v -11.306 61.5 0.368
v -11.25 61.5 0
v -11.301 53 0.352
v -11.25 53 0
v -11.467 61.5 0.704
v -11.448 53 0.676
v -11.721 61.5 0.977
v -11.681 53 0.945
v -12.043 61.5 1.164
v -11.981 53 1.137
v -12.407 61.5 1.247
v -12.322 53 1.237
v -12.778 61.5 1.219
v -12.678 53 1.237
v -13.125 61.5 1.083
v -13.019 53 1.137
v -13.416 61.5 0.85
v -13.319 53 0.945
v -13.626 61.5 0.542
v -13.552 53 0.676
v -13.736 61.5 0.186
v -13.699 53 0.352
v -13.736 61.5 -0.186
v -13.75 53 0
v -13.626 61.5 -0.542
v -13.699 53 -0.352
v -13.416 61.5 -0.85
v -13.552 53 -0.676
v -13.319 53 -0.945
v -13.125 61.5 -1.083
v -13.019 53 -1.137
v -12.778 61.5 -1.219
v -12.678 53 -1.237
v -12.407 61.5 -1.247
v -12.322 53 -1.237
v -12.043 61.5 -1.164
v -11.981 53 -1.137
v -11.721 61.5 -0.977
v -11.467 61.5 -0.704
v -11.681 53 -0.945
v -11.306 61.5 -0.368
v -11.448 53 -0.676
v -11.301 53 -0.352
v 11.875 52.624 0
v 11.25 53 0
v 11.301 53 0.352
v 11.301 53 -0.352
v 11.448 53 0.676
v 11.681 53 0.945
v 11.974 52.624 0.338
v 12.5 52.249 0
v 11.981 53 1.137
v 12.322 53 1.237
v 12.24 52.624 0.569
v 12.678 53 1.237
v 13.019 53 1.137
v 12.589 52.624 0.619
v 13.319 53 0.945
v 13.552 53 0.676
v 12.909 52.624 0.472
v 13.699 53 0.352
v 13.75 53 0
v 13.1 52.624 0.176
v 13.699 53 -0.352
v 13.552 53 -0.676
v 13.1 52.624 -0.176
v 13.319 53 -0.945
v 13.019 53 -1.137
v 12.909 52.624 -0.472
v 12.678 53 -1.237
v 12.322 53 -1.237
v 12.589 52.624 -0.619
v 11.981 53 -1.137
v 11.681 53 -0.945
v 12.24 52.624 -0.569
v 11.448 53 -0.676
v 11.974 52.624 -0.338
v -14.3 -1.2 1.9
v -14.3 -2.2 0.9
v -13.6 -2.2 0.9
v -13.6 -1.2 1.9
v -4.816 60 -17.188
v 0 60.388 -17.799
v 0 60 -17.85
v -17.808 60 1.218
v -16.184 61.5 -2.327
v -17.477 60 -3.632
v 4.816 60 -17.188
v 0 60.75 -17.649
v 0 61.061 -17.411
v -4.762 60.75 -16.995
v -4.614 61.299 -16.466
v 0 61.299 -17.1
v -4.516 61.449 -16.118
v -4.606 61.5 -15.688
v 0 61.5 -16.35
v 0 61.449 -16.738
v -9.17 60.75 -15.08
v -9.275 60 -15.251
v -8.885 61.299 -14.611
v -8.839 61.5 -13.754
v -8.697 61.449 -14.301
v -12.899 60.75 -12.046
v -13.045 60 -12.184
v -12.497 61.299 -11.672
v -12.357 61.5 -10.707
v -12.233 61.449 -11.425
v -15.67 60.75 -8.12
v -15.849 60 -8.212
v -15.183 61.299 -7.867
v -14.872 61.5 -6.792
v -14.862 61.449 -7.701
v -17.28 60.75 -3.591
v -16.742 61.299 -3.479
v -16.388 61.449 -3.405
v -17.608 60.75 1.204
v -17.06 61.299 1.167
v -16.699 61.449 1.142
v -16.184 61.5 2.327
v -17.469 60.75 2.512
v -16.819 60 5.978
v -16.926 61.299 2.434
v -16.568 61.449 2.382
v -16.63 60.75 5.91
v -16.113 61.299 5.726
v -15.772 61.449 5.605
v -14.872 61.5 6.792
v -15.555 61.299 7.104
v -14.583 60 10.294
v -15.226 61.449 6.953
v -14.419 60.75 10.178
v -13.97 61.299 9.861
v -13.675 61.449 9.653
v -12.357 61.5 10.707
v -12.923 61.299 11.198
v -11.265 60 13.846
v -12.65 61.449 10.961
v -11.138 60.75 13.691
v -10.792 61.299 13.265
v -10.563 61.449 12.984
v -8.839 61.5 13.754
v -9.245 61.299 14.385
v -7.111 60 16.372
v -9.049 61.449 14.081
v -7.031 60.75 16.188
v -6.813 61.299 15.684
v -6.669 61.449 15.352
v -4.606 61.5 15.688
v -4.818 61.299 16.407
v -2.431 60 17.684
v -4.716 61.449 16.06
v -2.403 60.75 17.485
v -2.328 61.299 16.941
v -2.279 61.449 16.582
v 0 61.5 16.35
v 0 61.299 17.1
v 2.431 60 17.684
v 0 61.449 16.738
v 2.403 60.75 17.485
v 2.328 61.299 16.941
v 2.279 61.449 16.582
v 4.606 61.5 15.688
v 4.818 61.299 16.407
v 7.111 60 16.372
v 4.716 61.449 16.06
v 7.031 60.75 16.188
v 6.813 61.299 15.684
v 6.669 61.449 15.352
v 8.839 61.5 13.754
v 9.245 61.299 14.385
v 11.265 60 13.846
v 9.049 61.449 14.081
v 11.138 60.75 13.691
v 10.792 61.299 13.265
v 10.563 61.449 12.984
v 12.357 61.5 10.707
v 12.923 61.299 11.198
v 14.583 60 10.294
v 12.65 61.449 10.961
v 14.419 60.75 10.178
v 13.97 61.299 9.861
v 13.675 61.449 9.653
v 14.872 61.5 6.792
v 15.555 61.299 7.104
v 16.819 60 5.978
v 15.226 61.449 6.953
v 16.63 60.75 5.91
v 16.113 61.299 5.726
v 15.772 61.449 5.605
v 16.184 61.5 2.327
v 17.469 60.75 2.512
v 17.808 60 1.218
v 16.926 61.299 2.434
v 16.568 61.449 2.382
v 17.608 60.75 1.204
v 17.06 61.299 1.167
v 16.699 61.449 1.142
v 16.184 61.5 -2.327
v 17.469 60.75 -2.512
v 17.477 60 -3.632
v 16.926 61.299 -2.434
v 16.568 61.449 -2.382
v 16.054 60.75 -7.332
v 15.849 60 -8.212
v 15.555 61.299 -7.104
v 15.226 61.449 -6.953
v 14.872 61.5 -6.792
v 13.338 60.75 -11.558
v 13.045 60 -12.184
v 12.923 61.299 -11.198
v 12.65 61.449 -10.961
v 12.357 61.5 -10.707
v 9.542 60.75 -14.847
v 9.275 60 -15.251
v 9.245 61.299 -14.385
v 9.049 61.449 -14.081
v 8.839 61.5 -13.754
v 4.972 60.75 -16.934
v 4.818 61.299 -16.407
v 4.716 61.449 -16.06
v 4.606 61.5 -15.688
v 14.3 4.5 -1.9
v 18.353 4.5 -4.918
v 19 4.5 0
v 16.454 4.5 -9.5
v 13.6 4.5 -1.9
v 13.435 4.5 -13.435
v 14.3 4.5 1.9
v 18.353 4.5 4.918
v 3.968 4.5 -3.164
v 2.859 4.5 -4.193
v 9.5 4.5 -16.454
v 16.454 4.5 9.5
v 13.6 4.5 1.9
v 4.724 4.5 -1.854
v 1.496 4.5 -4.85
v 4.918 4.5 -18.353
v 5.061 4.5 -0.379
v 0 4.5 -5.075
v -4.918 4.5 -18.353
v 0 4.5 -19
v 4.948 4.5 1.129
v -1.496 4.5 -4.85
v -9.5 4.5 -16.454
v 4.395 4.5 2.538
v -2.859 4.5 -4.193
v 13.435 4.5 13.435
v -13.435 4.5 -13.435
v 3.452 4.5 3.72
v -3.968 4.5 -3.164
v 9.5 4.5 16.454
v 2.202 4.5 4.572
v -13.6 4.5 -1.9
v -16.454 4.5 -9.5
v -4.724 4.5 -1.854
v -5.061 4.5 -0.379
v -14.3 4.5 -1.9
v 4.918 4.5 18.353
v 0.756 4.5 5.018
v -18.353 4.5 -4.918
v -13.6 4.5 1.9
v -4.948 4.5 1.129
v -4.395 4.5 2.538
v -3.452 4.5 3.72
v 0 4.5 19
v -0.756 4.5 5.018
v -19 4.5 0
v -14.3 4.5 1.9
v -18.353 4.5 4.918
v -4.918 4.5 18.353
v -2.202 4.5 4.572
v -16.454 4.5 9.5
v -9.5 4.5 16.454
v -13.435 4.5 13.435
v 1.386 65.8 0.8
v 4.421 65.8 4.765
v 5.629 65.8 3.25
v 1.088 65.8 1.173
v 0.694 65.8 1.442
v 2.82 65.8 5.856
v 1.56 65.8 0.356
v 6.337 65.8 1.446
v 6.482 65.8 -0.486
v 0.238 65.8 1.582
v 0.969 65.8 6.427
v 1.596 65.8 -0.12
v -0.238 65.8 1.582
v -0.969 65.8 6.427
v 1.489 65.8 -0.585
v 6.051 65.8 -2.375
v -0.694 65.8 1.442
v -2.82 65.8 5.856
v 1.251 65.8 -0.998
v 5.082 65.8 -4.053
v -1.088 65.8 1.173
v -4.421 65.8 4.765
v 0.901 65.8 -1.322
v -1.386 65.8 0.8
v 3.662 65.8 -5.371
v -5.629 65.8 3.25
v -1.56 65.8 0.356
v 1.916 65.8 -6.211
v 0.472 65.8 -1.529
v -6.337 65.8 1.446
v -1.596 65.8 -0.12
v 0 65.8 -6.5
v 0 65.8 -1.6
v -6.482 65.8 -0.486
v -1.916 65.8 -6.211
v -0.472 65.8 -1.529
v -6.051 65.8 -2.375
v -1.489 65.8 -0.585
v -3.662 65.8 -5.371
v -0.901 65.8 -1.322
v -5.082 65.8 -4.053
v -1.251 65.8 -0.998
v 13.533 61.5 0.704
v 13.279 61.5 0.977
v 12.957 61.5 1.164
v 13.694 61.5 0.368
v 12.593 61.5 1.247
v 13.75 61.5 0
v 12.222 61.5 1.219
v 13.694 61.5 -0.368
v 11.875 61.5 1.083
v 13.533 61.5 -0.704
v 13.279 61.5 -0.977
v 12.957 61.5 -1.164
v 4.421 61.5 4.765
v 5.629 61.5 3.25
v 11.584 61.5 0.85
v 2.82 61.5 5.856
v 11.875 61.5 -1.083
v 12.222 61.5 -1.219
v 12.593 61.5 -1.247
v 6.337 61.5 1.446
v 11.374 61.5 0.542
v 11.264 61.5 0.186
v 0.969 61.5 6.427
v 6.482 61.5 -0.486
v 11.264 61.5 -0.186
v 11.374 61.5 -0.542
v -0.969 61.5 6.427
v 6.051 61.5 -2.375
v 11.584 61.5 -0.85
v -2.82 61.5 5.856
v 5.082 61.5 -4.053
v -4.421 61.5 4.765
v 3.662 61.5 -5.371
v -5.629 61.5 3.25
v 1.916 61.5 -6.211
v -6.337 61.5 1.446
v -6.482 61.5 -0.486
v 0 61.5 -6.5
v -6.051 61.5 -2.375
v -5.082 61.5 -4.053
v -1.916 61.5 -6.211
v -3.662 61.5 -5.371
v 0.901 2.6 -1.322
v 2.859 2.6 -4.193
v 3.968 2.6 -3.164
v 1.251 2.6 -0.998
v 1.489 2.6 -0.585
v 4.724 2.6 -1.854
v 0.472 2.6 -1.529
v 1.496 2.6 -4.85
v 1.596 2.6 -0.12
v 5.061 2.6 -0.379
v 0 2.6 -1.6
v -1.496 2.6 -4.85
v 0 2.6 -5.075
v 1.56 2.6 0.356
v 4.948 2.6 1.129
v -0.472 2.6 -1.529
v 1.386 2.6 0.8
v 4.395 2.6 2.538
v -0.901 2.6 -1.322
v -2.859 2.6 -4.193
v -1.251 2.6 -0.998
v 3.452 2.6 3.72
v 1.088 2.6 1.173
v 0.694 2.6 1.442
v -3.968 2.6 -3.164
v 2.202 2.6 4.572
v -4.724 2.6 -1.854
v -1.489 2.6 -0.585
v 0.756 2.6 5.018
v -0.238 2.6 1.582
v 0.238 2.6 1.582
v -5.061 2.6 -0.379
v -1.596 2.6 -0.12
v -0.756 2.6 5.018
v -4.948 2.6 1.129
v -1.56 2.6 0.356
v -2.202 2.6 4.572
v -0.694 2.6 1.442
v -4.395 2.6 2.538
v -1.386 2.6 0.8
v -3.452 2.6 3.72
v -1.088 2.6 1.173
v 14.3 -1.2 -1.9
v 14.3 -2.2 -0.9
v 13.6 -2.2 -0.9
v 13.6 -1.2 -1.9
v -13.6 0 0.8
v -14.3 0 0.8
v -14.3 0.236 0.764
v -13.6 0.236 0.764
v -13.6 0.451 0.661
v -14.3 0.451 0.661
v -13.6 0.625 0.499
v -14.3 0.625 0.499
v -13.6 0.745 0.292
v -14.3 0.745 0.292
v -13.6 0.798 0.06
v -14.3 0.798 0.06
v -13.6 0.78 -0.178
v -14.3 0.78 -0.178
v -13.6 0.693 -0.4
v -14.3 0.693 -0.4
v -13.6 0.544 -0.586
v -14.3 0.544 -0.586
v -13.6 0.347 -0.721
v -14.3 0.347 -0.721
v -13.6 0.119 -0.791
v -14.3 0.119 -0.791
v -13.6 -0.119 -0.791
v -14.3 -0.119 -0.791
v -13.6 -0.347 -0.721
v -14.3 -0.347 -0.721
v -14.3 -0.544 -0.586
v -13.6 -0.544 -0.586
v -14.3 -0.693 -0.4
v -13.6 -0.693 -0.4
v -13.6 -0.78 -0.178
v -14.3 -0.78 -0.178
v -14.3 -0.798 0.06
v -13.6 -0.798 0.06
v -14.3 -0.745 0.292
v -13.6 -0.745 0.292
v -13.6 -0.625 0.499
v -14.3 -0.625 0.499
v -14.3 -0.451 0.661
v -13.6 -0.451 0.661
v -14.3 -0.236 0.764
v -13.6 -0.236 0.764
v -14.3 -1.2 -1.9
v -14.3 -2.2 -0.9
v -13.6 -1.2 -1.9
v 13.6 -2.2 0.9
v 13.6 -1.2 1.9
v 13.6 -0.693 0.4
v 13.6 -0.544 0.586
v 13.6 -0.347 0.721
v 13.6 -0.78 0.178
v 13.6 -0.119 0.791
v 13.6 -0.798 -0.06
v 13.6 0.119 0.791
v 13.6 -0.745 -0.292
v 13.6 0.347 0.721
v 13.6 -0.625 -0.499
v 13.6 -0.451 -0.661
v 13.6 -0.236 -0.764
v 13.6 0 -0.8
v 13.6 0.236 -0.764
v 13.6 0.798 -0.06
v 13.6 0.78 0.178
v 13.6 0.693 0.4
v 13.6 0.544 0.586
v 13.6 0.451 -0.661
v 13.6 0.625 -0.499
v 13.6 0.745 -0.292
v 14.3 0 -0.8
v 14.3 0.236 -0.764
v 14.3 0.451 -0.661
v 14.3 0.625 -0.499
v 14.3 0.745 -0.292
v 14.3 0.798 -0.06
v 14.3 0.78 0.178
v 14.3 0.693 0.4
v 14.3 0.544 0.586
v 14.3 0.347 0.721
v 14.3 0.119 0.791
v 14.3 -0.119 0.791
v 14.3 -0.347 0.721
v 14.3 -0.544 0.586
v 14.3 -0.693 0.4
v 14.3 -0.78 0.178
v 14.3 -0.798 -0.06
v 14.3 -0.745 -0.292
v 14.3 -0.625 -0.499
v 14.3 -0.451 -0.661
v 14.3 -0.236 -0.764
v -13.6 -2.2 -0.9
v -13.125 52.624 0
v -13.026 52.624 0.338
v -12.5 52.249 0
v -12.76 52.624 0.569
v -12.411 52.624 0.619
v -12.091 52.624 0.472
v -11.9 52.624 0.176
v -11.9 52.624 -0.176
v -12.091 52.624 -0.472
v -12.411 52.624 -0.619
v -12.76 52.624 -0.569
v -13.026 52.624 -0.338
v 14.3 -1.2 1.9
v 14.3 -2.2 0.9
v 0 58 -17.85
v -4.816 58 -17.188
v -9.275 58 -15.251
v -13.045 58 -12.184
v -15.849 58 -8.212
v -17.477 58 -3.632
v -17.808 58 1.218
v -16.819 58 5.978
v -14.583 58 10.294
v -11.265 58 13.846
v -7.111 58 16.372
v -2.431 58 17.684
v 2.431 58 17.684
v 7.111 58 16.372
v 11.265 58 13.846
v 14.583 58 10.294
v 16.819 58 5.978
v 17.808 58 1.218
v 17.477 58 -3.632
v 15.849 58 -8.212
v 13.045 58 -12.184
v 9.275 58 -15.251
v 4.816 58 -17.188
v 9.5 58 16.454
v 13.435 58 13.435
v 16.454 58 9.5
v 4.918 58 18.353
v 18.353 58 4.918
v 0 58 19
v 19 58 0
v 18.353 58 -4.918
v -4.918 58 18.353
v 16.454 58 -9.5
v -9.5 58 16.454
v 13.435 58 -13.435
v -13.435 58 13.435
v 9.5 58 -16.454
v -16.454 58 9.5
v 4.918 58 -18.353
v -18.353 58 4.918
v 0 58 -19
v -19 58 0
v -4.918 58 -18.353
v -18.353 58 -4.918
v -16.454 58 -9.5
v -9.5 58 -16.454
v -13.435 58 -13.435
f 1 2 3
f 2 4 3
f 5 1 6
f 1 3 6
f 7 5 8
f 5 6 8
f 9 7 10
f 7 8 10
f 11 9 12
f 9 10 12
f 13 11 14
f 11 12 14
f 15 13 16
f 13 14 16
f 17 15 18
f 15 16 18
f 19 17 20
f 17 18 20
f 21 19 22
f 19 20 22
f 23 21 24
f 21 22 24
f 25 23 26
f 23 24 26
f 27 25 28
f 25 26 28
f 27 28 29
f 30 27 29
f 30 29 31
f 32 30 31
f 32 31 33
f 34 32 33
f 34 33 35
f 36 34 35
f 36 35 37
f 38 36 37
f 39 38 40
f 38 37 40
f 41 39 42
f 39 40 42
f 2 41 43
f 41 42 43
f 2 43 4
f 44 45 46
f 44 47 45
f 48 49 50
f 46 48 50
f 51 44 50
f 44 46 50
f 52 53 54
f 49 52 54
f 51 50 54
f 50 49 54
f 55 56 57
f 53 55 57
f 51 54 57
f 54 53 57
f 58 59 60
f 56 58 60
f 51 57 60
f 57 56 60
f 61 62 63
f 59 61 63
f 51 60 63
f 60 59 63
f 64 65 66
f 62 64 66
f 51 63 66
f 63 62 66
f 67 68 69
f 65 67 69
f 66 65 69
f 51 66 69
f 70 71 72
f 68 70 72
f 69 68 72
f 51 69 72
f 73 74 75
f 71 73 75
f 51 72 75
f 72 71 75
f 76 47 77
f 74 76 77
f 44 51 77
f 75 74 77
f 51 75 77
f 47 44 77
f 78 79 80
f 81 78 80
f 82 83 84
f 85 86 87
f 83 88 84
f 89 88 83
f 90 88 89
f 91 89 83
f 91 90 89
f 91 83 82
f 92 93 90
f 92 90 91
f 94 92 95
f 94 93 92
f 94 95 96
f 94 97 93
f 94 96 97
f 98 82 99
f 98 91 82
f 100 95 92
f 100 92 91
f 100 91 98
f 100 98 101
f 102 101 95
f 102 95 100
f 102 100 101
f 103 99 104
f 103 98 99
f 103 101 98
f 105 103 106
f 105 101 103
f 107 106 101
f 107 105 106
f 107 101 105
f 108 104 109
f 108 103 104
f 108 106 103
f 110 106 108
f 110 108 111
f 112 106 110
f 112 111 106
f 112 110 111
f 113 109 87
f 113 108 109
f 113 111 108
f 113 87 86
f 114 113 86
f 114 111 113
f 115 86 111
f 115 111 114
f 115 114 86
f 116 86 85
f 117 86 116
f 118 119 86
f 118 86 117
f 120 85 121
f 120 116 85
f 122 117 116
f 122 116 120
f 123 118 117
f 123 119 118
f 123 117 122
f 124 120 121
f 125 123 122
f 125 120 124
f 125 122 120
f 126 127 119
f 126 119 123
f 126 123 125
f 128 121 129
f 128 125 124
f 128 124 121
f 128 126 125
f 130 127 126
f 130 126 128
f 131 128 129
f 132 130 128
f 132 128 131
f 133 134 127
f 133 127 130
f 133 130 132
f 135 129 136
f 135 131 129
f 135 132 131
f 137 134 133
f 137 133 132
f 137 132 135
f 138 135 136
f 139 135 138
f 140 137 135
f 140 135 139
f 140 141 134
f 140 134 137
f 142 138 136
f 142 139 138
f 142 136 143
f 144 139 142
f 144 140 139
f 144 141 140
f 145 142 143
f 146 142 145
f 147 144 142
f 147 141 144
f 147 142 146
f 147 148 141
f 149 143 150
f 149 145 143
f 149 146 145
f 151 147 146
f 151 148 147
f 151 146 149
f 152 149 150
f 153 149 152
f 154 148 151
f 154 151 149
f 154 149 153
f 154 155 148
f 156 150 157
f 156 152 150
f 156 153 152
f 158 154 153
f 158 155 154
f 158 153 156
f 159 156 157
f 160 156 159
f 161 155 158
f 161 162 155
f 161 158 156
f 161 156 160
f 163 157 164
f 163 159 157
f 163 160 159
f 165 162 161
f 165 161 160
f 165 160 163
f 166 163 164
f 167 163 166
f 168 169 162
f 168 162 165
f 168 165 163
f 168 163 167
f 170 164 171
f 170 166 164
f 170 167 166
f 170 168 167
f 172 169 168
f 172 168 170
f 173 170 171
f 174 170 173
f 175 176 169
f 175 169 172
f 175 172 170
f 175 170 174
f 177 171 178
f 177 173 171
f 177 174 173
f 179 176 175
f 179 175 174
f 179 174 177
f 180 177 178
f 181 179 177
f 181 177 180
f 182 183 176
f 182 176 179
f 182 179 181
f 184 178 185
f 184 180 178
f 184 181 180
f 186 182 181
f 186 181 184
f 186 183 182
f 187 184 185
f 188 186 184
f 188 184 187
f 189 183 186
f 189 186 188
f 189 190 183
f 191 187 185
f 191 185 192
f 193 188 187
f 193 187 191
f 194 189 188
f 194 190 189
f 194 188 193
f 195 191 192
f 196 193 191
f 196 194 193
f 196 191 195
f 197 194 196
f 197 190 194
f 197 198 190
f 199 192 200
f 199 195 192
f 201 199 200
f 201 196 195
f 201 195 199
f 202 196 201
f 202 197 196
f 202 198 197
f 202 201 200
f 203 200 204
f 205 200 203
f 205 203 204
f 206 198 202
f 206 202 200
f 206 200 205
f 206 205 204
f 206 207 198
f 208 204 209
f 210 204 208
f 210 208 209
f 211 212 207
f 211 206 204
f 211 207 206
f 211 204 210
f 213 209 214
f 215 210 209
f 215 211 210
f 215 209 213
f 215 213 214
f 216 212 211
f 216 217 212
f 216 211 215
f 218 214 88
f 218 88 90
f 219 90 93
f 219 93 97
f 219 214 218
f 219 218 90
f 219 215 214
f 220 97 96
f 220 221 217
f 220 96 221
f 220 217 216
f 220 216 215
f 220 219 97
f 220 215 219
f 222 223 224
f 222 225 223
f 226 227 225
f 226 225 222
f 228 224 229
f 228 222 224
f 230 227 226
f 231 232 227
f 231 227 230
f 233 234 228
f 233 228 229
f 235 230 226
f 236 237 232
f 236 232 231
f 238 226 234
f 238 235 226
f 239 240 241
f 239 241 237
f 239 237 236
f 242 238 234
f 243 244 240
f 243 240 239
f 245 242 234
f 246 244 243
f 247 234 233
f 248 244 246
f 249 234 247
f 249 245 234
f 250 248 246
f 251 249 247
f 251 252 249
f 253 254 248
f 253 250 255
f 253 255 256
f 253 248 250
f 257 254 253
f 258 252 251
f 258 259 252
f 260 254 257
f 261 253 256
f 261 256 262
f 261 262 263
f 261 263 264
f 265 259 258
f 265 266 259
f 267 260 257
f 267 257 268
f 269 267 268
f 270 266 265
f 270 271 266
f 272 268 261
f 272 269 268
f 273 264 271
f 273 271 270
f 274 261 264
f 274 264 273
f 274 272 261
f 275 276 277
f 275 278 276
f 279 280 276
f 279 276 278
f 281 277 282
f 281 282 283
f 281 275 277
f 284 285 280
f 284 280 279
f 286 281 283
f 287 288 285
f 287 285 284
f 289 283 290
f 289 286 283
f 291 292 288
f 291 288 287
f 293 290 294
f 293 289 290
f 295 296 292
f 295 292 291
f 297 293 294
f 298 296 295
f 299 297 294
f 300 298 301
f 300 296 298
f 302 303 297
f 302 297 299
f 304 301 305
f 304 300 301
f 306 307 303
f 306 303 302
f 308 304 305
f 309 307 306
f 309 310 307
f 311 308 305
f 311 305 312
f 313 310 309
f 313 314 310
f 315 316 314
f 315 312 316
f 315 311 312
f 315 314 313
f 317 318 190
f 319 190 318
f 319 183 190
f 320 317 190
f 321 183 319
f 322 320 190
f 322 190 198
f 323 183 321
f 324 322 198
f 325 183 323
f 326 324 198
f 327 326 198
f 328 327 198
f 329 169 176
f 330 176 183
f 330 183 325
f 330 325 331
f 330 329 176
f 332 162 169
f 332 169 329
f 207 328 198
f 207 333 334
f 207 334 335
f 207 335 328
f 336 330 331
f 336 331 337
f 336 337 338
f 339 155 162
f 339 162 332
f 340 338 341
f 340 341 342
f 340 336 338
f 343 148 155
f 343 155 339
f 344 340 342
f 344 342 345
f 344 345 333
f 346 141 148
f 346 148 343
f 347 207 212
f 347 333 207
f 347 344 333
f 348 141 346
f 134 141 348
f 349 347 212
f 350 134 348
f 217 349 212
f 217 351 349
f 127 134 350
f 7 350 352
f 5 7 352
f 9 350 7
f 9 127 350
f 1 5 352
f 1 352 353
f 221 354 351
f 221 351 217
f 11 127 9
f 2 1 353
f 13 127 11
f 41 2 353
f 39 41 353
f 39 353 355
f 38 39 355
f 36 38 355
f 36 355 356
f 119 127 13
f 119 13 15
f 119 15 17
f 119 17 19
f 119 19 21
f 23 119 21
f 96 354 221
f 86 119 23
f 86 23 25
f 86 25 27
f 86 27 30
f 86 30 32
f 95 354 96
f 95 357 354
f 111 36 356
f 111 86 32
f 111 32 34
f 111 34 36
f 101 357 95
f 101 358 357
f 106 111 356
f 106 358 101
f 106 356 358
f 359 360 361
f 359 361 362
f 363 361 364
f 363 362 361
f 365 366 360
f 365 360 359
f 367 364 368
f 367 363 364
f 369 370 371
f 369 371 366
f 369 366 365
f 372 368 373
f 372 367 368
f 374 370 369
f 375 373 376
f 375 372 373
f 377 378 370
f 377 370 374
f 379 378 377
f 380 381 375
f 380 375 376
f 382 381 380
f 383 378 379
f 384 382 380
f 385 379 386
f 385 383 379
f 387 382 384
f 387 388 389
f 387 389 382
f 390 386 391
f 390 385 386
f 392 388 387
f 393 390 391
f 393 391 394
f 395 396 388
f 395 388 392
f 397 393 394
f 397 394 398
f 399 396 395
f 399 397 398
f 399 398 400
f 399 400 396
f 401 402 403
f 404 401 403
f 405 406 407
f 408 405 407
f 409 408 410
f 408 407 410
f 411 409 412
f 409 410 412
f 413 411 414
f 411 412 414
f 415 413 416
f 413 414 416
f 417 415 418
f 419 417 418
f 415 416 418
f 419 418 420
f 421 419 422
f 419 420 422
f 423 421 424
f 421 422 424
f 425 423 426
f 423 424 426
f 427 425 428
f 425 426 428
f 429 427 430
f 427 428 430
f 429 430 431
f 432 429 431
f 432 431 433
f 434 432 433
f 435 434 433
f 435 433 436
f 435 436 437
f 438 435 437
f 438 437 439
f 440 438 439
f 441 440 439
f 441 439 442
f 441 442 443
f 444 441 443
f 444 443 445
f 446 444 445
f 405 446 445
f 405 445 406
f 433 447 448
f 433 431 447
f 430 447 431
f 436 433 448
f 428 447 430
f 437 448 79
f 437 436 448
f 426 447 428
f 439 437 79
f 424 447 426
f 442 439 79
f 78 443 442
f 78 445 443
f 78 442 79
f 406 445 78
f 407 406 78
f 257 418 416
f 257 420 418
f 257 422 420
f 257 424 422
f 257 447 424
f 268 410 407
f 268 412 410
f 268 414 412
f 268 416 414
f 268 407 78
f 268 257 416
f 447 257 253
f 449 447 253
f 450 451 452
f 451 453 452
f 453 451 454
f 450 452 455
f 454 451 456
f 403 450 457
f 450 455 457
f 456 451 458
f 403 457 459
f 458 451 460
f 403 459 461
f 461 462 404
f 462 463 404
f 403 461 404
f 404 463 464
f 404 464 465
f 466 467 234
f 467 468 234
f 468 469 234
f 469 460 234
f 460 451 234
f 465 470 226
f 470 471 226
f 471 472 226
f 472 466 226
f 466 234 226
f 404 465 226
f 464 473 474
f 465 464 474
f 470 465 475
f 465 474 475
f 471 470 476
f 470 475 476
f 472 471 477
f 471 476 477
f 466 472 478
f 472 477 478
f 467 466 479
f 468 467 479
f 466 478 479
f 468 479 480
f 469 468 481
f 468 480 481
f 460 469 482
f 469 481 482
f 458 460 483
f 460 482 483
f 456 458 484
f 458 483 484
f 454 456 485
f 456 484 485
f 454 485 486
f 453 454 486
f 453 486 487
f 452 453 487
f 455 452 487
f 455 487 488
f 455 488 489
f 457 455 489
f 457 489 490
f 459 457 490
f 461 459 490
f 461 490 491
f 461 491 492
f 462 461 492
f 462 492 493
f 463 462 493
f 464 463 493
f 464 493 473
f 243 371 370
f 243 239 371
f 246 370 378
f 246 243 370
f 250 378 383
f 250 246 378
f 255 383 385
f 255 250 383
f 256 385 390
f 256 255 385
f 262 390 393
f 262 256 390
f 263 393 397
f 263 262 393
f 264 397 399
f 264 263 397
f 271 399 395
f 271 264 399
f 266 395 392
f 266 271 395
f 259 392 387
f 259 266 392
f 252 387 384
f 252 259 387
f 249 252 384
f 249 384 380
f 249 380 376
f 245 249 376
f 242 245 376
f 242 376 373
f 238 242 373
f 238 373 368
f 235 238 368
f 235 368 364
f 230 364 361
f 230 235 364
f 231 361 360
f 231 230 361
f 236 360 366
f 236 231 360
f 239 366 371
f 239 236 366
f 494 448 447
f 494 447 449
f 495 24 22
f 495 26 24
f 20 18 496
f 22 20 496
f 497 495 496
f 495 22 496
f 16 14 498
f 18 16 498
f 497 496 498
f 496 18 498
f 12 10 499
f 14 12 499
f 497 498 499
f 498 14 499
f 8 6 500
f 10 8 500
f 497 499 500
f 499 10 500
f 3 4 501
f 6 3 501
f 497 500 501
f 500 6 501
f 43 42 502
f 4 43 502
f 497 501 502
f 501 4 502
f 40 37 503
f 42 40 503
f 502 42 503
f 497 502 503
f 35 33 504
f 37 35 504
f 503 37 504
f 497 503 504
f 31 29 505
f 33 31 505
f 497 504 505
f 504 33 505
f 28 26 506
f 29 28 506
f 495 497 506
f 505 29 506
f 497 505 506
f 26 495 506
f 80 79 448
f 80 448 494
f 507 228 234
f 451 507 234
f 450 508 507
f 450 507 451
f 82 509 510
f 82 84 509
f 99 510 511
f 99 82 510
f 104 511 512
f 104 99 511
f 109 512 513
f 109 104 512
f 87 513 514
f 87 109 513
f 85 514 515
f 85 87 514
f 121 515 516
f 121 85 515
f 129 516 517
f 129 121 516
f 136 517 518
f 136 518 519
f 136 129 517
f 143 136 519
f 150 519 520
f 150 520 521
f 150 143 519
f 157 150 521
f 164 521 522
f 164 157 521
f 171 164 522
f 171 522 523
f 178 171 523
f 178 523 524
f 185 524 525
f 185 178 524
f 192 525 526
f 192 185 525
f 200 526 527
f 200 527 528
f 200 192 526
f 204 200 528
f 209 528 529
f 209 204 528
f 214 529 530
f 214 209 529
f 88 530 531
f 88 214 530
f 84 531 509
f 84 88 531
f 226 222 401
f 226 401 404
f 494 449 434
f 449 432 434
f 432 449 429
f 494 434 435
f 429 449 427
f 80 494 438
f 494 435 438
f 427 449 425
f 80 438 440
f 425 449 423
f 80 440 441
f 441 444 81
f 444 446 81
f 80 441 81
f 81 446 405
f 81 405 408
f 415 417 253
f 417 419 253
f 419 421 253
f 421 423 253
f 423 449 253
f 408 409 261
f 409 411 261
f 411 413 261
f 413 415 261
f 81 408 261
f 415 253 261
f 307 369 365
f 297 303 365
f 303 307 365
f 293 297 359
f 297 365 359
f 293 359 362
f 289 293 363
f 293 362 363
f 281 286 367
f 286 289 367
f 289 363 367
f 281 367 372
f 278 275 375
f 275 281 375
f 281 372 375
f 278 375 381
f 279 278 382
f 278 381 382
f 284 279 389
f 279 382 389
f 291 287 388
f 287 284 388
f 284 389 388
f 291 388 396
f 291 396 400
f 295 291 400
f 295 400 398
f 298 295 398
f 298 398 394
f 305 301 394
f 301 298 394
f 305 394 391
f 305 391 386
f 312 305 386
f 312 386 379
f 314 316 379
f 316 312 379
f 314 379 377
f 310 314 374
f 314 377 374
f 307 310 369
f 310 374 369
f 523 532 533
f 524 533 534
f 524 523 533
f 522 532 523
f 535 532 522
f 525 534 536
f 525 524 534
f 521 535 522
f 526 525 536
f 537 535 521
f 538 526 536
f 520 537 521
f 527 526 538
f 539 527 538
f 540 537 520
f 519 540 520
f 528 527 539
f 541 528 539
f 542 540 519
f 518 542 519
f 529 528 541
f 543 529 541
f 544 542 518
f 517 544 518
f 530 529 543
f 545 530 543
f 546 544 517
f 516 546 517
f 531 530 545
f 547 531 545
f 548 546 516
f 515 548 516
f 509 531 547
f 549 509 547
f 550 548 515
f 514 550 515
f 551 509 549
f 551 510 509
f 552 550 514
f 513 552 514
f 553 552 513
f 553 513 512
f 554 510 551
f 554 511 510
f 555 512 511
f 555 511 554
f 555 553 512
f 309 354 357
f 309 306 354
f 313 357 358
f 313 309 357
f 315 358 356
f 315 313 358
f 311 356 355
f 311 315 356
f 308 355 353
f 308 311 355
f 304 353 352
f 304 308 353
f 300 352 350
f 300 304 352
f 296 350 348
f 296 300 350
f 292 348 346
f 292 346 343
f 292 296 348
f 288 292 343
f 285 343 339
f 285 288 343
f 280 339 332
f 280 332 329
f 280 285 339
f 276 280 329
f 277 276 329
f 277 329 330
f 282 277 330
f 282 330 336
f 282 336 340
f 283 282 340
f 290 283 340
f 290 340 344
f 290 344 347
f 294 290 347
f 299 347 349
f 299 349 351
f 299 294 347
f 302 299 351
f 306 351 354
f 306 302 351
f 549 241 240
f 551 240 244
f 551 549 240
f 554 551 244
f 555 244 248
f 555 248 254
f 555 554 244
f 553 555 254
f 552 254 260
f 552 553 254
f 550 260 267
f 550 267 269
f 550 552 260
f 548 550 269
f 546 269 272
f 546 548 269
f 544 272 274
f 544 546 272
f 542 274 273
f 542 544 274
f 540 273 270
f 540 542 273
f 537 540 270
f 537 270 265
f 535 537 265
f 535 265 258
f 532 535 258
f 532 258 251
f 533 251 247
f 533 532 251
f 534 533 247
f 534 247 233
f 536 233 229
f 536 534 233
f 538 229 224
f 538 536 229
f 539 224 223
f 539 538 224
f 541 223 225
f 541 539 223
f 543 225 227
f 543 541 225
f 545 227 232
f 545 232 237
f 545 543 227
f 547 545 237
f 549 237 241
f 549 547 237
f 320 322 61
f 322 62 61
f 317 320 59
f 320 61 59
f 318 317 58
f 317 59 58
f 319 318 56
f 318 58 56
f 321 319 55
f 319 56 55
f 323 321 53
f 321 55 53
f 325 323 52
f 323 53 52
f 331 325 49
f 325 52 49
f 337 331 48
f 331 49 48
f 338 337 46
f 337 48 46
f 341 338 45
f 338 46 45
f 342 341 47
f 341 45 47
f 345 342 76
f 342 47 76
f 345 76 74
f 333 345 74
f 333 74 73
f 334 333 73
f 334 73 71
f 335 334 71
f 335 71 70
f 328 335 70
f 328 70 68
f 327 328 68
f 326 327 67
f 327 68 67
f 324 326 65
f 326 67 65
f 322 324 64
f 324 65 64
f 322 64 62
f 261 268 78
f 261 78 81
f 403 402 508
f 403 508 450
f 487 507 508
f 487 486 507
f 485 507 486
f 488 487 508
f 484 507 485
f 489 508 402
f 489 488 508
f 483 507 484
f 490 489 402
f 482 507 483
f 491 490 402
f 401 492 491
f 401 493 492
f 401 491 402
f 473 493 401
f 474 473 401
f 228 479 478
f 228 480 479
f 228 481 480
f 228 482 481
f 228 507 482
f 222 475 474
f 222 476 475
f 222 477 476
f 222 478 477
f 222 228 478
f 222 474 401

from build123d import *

# Parameters (mm, degrees)
ENL_V_MAT_EXTRU_1_DEPTH                   = 15
TROU_TARAUD_M31_D                         = 2.5
TROU_TARAUD_M31_DEPTH                     = 8.5
TROU_TARAUD_M31_TIP                       = 0.751075774
ESQUISSE5_W                               = 0.7
ESQUISSE5_H                               = 3.8
BOSS_EXTRU_1_DEPTH                        = 6.7
CHANFREIN1_SIZE                           = 1
ESQUISSE6_R                               = 0.8
ENL_V_MAT_EXTRU_2_DEPTH                   = 6.7
R_P_TITION_CIRCULAIRE1_COUNT              = 2
CHANFREIN1_OF_R_P_TITION_CIRCULAIRE1_SIZE = 1
ESQUISSE7_R                               = 1.6
ENL_V_MAT_EXTRU_3_DEPTH                   = 90.145947749


with BuildPart() as part:
    # Esquisse1 → Révolution1 (revolve)
    with BuildSketch(Plane.XY, mode=Mode.PRIVATE) as r_volution1_sk:
        with BuildLine():
            Line((0, 0), (-1.6, 0))
            Line((-1.6, 0), (-1.6, 2.6))
            Line((-1.6, 2.6), (-5.075, 2.6))
            Line((-5.075, 2.6), (-5.075, 4.5))
            Line((-5.075, 4.5), (-19, 4.5))
            Line((-19, 4.5), (-19, 58))
            Line((-19, 58), (-17.85, 58))
            Line((-17.85, 58), (-17.85, 60))
            ThreePointArc((-17.85, 60), (-17.410660172, 61.060660172), (-16.35, 61.5))
            Line((-16.35, 61.5), (-6.5, 61.5))
            Line((-6.5, 61.5), (-6.5, 65.8))
            Line((-6.5, 65.8), (-1.6, 65.8))
            Line((-1.6, 65.8), (-1.6, 85))
            Line((-1.6, 85), (0, 85))
            Line((0, 85), (0, 0))
        make_face()
    revolve(r_volution1_sk.sketch.rotate(Axis((0, 0, 0), (0, 1, 0)), 270), axis=Axis((0, 0, 0), (0, 1, 0)))

    # Esquisse2 → Enlèv. mat.-Extru.1 (cut)
    with BuildSketch(Plane(origin=(0, 85, 0), x_dir=(1, 0, 0), z_dir=(0, 1, 0))):
        with BuildLine():
            Line((-1.161895004, -1.1), (1.161895004, -1.1))
            ThreePointArc((1.161895004, -1.1), (0, -1.6), (-1.161895004, -1.1))
        make_face()
    extrude(amount=-ENL_V_MAT_EXTRU_1_DEPTH, mode=Mode.SUBTRACT)

    # Trou taraudé M31
    with Locations(Plane(origin=(0, 61.5, 0), x_dir=(-1, 0, 0), z_dir=(0, 1, 0))):
        with Locations((12.5, 0), (-12.5, 0)):
            Hole(TROU_TARAUD_M31_D / 2, depth=TROU_TARAUD_M31_DEPTH)
            with Locations((0, 0, -(TROU_TARAUD_M31_DEPTH + TROU_TARAUD_M31_TIP / 2))):  # 118° drill point
                Cone(0, TROU_TARAUD_M31_D / 2, TROU_TARAUD_M31_TIP, mode=Mode.SUBTRACT)

    # Esquisse5 → Boss.-Extru.1 (add)
    with BuildSketch(Plane.XZ.offset(-4.5)):
        with Locations((-13.95, 0)):
            Rectangle(ESQUISSE5_W, ESQUISSE5_H)
    boss_extru_1 = extrude(amount=BOSS_EXTRU_1_DEPTH)

    # Chanfrein1
    chanfrein1_edges = [part.edges().sort_by_distance(p)[0] for p in [
        (-13.95, -2.2, -1.9),
        (-13.95, -2.2, 1.9),
    ]]
    chamfer(chanfrein1_edges, length=CHANFREIN1_SIZE)

    # Esquisse6 → Enlèv. mat.-Extru.2 (cut)
    with BuildSketch(Plane.ZY.offset(14.3)):
        Circle(ESQUISSE6_R)
    enl_v_mat_extru_2 = extrude(amount=-ENL_V_MAT_EXTRU_2_DEPTH, mode=Mode.SUBTRACT)

    # Répétition circulaire1: Boss.-Extru.1, Enlèv. mat.-Extru.2 ×2 about axis
    r_p_tition_circulaire1_axis = Axis((0, 0, 0), (0, 1, 0))
    add([boss_extru_1.rotate(r_p_tition_circulaire1_axis, i * 360 / R_P_TITION_CIRCULAIRE1_COUNT) for i in range(1, R_P_TITION_CIRCULAIRE1_COUNT)])
    add([enl_v_mat_extru_2.rotate(r_p_tition_circulaire1_axis, i * 360 / R_P_TITION_CIRCULAIRE1_COUNT) for i in range(1, R_P_TITION_CIRCULAIRE1_COUNT)], mode=Mode.SUBTRACT)

    # Chanfrein1 of Répétition circulaire1
    chanfrein1_of_r_p_tition_circulaire1_edges = [part.edges().sort_by_distance(p)[0] for p in [
        (13.95, -2.2, 1.9),
        (13.95, -2.2, -1.9),
    ]]
    chamfer(chanfrein1_of_r_p_tition_circulaire1_edges, length=CHANFREIN1_OF_R_P_TITION_CIRCULAIRE1_SIZE)

    # Esquisse7 → Enlèv. mat.-Extru.3 (cut, through all)
    with BuildSketch(Plane.XZ):
        with Locations(Location((0, 0, 0), (0, 0, 270))):
            Circle(ESQUISSE7_R)
    extrude(amount=-ENL_V_MAT_EXTRU_3_DEPTH, mode=Mode.SUBTRACT)


solid = part.part
